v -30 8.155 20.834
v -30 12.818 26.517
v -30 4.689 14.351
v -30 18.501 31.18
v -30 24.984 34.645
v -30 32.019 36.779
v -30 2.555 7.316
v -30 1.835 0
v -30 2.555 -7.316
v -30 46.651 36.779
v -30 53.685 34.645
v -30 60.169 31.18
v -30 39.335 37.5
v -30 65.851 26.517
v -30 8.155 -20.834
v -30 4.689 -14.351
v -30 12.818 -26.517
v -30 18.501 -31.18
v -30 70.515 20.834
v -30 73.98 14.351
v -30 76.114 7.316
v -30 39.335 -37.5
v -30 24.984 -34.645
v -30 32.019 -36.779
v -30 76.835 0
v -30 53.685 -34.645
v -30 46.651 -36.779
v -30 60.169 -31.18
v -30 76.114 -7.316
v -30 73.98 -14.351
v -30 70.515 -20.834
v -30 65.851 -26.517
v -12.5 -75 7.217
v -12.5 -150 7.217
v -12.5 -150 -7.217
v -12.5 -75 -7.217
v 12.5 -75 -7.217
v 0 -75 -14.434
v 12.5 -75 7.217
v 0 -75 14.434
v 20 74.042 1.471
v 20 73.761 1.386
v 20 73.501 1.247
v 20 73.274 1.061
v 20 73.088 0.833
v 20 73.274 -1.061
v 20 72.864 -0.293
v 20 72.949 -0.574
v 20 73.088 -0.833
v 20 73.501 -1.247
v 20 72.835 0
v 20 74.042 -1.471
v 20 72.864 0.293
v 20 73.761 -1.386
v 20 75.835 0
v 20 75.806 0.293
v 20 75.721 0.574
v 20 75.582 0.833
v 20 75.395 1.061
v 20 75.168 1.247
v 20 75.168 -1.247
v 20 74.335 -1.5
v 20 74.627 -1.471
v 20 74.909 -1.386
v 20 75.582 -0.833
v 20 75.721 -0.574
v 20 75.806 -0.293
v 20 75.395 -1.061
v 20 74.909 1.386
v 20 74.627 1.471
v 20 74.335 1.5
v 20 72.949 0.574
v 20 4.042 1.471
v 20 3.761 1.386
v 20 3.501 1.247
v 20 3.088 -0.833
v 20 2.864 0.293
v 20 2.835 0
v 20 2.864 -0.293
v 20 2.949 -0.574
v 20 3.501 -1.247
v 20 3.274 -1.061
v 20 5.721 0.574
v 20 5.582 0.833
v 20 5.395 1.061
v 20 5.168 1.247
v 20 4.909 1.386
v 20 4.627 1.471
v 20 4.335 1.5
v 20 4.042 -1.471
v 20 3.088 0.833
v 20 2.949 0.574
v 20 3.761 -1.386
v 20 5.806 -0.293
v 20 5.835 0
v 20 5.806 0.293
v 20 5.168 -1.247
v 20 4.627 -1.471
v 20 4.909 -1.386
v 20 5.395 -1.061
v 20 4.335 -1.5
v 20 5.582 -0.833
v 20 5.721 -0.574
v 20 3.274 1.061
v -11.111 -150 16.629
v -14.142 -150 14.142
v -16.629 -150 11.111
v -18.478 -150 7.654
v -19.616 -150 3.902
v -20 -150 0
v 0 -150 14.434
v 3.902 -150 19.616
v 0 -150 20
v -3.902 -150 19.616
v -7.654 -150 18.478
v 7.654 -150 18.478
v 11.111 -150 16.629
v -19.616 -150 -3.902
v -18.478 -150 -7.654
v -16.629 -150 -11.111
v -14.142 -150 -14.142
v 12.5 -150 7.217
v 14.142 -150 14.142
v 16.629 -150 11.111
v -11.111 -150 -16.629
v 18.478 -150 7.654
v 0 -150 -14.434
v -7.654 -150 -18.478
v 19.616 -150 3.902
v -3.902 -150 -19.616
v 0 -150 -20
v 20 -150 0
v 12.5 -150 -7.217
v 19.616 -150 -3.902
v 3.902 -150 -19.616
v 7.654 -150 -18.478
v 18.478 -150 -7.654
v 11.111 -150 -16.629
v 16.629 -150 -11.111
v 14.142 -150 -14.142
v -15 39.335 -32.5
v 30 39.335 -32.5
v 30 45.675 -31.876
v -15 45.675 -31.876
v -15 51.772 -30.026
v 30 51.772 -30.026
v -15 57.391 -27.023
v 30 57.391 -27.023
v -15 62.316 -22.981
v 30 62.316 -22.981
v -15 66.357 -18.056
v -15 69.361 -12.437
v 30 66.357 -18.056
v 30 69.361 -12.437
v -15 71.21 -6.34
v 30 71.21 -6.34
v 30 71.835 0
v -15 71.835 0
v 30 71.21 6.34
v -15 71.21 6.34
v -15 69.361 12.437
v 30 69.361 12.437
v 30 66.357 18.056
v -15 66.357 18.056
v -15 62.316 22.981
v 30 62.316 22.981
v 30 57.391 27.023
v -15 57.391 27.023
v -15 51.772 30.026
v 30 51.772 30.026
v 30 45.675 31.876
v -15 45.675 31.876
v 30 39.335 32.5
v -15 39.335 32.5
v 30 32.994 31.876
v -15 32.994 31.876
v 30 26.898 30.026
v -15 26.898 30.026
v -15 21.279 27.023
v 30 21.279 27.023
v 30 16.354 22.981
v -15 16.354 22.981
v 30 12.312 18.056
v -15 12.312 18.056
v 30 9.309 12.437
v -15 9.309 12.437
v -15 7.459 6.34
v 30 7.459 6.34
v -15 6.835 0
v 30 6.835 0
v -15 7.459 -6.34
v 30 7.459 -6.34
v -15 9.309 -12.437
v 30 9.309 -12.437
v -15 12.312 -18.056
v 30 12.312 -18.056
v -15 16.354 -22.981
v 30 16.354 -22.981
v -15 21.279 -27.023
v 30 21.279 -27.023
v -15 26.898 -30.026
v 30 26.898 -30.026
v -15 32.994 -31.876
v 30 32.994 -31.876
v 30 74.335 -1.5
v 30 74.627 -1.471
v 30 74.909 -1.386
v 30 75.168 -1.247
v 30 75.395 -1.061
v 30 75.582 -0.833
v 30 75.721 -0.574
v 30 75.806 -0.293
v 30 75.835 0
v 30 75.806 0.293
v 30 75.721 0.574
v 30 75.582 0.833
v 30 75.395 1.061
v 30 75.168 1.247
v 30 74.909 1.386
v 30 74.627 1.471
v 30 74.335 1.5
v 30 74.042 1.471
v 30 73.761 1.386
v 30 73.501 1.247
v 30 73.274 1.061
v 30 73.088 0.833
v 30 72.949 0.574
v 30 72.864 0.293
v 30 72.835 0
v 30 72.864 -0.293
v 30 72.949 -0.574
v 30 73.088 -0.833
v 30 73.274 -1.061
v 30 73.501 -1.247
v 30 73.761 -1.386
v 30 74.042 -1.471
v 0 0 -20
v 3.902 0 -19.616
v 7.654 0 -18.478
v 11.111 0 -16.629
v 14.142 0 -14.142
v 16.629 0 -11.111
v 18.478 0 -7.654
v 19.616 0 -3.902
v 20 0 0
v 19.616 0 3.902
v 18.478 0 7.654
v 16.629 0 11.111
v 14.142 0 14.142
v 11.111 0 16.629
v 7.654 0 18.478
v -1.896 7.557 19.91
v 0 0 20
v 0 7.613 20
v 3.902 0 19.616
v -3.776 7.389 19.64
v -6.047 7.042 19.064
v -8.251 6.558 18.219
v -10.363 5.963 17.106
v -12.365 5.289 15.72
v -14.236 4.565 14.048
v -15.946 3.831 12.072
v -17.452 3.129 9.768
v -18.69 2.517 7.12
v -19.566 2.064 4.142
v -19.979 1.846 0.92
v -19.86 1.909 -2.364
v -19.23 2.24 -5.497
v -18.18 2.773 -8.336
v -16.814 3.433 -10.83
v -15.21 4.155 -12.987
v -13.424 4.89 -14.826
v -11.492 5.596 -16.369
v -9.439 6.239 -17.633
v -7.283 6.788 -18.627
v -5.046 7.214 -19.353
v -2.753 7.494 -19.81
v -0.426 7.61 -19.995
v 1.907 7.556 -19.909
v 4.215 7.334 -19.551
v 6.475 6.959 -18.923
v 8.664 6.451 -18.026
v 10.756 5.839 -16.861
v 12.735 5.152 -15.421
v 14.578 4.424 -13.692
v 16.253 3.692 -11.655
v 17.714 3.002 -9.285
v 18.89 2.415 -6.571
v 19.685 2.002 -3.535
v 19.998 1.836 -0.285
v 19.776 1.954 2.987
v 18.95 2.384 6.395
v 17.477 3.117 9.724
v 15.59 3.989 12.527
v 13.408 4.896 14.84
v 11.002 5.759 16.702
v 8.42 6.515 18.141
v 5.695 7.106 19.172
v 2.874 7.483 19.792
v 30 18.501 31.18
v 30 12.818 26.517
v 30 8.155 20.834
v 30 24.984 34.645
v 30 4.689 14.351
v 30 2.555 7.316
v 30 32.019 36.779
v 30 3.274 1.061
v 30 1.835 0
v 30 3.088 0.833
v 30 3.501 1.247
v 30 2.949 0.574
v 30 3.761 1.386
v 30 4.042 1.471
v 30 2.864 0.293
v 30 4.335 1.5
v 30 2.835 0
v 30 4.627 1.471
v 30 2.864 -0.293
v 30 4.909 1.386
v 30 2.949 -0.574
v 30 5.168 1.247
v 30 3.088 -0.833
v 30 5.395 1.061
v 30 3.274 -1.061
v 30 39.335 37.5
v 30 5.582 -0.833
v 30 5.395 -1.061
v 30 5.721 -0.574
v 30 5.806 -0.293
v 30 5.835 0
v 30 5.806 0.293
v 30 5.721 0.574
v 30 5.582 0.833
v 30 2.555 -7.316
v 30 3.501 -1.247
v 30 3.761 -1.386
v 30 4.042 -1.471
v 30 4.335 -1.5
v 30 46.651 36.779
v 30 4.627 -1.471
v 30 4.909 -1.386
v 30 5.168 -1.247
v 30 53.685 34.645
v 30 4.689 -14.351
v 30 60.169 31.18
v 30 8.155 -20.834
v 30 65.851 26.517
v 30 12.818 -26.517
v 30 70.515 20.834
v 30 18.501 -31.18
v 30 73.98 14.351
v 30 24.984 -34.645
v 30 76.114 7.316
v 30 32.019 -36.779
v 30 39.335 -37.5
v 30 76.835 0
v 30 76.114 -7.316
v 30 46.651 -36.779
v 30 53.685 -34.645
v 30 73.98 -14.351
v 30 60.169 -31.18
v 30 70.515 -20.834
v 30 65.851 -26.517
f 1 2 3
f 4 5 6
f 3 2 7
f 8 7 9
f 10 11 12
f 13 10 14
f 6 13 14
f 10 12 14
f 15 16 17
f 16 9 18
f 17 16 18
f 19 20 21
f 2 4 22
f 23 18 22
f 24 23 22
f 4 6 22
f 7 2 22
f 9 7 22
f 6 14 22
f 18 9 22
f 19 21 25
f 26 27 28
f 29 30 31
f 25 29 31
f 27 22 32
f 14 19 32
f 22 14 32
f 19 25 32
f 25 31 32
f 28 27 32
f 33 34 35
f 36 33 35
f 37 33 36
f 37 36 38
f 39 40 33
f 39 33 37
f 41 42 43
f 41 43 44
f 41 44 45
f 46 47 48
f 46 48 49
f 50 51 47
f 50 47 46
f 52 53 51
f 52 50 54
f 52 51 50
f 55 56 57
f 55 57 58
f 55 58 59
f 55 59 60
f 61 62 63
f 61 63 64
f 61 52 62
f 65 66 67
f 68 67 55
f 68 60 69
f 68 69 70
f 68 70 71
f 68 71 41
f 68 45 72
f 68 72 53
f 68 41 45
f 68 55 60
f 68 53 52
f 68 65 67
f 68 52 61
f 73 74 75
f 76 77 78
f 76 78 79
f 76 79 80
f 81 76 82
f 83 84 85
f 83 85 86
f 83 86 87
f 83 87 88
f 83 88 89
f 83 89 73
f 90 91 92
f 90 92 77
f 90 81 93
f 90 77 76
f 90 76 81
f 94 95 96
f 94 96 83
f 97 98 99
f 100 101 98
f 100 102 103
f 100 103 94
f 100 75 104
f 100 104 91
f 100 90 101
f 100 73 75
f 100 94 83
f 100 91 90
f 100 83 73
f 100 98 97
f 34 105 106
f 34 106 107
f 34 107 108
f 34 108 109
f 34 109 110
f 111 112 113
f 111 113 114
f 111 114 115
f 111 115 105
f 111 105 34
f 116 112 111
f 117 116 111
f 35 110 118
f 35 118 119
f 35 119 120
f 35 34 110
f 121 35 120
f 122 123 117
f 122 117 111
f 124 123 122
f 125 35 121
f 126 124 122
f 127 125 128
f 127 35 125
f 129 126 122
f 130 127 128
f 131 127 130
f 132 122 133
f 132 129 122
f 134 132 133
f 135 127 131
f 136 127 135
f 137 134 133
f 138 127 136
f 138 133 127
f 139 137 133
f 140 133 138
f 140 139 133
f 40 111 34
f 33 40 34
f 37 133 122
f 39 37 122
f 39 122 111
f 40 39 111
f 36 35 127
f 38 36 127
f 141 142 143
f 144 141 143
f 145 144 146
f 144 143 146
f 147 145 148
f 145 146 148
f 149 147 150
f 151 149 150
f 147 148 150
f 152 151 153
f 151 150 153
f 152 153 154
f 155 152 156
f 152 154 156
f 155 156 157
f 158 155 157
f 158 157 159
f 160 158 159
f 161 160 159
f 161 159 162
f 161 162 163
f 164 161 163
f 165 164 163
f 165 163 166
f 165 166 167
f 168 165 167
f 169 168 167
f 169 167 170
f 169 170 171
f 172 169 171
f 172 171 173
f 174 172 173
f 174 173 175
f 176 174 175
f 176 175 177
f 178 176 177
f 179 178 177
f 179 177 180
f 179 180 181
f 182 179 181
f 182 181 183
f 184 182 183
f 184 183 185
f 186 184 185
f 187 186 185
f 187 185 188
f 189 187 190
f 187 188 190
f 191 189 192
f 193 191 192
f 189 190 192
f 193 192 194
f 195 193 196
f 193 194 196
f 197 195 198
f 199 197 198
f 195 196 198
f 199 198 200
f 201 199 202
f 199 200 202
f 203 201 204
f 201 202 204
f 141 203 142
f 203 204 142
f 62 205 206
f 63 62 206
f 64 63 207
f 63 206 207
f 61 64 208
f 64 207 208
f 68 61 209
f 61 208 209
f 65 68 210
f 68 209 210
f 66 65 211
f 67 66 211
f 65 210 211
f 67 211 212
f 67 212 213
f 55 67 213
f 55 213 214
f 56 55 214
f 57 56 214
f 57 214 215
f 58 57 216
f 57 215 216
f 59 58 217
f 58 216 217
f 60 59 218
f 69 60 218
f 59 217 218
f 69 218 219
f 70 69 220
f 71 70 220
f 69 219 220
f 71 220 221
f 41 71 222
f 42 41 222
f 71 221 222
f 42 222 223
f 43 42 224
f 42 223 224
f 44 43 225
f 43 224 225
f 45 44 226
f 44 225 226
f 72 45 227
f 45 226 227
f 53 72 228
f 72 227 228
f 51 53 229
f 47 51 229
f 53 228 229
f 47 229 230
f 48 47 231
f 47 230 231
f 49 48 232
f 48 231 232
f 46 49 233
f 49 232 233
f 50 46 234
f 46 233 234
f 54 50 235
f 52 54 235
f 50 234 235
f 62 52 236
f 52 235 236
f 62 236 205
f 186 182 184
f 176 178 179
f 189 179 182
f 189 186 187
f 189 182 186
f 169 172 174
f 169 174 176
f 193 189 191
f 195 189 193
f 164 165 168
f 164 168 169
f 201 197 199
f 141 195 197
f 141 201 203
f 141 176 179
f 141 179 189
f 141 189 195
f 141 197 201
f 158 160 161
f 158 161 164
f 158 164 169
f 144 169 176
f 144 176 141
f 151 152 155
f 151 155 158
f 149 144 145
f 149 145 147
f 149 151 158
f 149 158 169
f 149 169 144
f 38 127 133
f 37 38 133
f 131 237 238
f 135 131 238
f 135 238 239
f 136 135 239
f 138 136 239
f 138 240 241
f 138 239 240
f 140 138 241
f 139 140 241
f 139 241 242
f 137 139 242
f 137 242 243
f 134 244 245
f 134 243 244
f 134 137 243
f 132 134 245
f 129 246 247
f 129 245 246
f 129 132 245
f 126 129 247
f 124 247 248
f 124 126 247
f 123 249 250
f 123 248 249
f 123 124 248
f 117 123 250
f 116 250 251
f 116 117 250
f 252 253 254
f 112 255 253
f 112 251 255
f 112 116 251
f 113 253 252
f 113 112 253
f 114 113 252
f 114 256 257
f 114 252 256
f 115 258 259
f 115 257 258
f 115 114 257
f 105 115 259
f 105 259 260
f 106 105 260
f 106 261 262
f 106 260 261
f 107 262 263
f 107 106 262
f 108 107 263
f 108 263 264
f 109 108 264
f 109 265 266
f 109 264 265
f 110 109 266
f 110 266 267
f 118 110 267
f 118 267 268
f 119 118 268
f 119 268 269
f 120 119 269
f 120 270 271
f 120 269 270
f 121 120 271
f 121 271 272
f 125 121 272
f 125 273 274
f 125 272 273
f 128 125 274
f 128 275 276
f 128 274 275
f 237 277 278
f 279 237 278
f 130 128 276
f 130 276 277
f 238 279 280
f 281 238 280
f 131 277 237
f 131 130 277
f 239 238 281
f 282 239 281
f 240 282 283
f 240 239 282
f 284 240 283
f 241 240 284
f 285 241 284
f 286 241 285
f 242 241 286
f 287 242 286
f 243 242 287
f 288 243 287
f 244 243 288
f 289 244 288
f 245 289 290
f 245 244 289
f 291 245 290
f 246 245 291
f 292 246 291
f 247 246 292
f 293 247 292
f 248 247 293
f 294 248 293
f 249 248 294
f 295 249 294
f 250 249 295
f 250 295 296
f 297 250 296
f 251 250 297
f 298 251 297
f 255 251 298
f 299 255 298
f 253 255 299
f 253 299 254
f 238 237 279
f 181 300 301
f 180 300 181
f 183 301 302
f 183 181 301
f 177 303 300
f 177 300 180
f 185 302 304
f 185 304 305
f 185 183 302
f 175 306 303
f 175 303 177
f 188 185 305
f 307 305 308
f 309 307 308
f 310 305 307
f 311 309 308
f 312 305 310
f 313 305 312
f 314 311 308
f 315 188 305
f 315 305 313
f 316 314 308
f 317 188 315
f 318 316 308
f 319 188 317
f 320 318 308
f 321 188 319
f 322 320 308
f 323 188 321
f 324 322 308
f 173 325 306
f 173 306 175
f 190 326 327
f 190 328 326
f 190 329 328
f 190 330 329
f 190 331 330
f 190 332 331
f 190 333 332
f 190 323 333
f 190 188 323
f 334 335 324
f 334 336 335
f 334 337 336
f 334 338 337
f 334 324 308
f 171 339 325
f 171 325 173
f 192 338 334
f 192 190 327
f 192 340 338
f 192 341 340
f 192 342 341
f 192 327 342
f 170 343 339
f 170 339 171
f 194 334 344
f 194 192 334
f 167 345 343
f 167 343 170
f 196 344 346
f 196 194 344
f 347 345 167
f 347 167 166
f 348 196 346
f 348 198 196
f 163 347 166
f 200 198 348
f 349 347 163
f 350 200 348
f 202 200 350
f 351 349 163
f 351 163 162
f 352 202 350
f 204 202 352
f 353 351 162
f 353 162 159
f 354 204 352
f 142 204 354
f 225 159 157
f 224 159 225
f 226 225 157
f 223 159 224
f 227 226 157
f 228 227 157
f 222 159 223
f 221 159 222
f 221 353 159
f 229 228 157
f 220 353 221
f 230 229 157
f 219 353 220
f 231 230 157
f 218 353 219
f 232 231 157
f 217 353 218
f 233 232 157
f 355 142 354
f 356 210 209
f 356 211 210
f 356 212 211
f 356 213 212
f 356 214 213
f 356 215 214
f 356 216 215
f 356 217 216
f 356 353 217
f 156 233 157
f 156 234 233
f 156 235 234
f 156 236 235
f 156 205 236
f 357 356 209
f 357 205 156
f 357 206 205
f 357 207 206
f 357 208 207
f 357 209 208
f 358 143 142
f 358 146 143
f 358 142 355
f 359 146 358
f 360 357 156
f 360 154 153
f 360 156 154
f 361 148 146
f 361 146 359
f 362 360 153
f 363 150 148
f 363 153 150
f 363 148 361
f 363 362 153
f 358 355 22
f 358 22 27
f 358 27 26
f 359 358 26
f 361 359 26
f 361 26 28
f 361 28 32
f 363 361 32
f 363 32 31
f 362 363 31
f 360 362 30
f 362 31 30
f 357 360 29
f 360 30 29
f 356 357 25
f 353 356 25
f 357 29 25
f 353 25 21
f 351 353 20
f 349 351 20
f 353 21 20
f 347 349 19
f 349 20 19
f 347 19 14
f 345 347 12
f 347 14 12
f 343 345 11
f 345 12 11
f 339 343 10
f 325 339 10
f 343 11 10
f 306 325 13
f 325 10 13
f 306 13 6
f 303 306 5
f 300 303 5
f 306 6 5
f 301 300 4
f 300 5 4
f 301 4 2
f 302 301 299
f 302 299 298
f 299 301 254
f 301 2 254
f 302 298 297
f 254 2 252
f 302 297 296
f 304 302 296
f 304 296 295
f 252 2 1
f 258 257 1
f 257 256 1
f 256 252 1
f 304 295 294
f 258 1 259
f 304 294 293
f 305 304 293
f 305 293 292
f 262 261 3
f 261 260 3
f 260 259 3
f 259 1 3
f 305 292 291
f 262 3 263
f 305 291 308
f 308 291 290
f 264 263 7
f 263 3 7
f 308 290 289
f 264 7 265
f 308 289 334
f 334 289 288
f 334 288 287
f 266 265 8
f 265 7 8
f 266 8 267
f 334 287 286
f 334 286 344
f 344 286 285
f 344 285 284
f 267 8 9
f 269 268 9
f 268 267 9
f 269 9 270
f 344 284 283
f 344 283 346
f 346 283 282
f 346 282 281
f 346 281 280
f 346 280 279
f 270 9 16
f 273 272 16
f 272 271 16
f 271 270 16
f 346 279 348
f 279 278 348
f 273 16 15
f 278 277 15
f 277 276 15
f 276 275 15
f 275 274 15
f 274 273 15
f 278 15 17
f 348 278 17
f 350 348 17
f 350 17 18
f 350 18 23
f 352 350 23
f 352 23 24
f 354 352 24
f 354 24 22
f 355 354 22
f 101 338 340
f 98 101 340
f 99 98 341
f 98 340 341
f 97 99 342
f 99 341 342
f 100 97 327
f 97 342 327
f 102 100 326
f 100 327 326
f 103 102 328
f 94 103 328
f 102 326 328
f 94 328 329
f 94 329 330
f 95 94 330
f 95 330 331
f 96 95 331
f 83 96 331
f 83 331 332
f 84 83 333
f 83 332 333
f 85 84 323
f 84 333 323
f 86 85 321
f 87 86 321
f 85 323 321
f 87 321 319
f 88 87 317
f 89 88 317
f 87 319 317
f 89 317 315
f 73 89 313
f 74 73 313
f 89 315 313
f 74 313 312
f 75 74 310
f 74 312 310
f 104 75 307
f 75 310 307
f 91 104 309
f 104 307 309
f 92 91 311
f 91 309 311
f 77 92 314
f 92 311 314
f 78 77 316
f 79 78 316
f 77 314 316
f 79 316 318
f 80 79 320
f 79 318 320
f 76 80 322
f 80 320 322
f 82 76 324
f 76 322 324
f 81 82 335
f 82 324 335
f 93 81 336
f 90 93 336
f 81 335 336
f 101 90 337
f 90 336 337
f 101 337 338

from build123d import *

# Parameters (mm, degrees)
SKETCH1_R                 = 20
BOSS_EXTRUDE1_DEPTH       = 25
BOSS_EXTRUDE2_START       = 100
SKETCH2_R                 = 20
BOSS_EXTRUDE2_DEPTH       = 100
BOSS_EXTRUDE4_START       = -100
SKETCH6_R                 = 20
BOSS_EXTRUDE4_DEPTH       = 100
SKETCH7_R                 = 25
CUT_EXTRUDE2_DEPTH        = 40
SKETCH8_R                 = 25
SKETCH8_R_2               = 22.5
BOSS_EXTRUDE7_DEPTH       = 40
SKETCH9_R                 = 25
BOSS_EXTRUDE8_DEPTH       = 2
BOSS_EXTRUDE10_DEPTH      = 38
CUT_EXTRUDE3_DEPTH        = 25
SKETCH12_R                = 25
CUT_EXTRUDE4_DEPTH        = 75
BOSS_EXTRUDE11_START      = 50
SKETCH14_R                = 20
BOSS_EXTRUDE11_DEPTH      = 50
BOSS_EXTRUDE12_DEPTH      = 10
BOSS_EXTRUDE12_DEPTH_BACK = 50
SKETCH13_R                = 37.5
SKETCH17_R                = 32.5
CUT_EXTRUDE5_DEPTH        = 50
BOSS_EXTRUDE13_START      = 2
SKETCH18_R                = 37.5
SKETCH18_R_2              = 32.5
BOSS_EXTRUDE13_DEPTH      = 2
SKETCH21_R                = 37.5
SKETCH21_R_2              = 32.5
CUT_EXTRUDE6_DEPTH        = 2
SKETCH22_R                = 1.5
CUT_EXTRUDE7_DEPTH        = 10
BOSS_EXTRUDE14_START      = 5
SKETCH27_R                = 32.5
BOSS_EXTRUDE14_DEPTH      = 5


with BuildPart() as part:
    # Sketch1 → Boss-Extrude1 (new body)
    with BuildSketch(Plane(origin=(0, 0, 0), x_dir=(1, 0, 0), z_dir=(0, 1, 0))):
        with Locations(Location((0, 0, 0), (0, 0, 270))):
            Circle(SKETCH1_R)
        Polygon((14.43375673, 0), (7.216878365, 12.5), (-7.216878365, 12.5), (-14.43375673, 0), (-7.216878365, -12.5), (7.216878365, -12.5), align=None, mode=Mode.SUBTRACT)
    extrude(amount=BOSS_EXTRUDE1_DEPTH)

    # Sketch2 → Boss-Extrude2 (add)
    with BuildSketch(Plane.XZ.offset(BOSS_EXTRUDE2_START)):
        with Locations(Location((0, 0, 0), (0, 0, 270))):
            Circle(SKETCH2_R)
    extrude(amount=-BOSS_EXTRUDE2_DEPTH)

    # Sketch6 → Boss-Extrude4 (add)
    with BuildSketch(Plane(origin=(0, 25, 0), x_dir=(1, 0, 0), z_dir=(0, 1, 0)).offset(BOSS_EXTRUDE4_START)):
        with Locations(Location((0, 0, 0), (0, 0, 90))):
            Circle(SKETCH6_R)
    extrude(amount=BOSS_EXTRUDE4_DEPTH)

    # Sketch7 → Cut-Extrude2 (cut)
    with BuildSketch(Plane(origin=(20, 0, 0), x_dir=(0, 0, -1), z_dir=(1, 0, 0))):
        with Locations((0, 39.286563349)):
            Circle(SKETCH7_R)
    extrude(amount=-CUT_EXTRUDE2_DEPTH, mode=Mode.SUBTRACT)

    # Sketch8 → Boss-Extrude7 (add)
    with BuildSketch(Plane(origin=(20, 0, 0), x_dir=(0, 0, -1), z_dir=(1, 0, 0))):
        with Locations((0, 39.252781264)):
            Circle(SKETCH8_R)
        with Locations((0, 39.252781264)):
            Circle(SKETCH8_R_2, mode=Mode.SUBTRACT)
    extrude(amount=-BOSS_EXTRUDE7_DEPTH)

    # Sketch9 → Boss-Extrude8 (add)
    with BuildSketch(Plane(origin=(20, 0, 0), x_dir=(0, 0, -1), z_dir=(1, 0, 0))):
        with Locations((0, 39.252781264)):
            Circle(SKETCH9_R)
    extrude(amount=-BOSS_EXTRUDE8_DEPTH)

    # Sketch10 → Boss-Extrude10 (add)
    with BuildSketch(Plane.ZY.offset(-18)):
        with BuildLine():
            Line((-15.081099266, 22.555163323), (15.081099266, 22.555163323))
            ThreePointArc((15.081099266, 22.555163323), (0, 16.752781264), (-15.081099266, 22.555163323))
        make_face()
    extrude(amount=BOSS_EXTRUDE10_DEPTH)

    # Sketch11 → Cut-Extrude3 (cut)
    with BuildSketch(Plane.XZ.offset(100)):
        Polygon((12.5, 7.216878365), (0, 14.43375673), (0, 0), (12.5, 0), align=None)
        Polygon((0, 0), (0, 14.43375673), (-12.5, 7.216878365), (-12.5, -7.216878365), (0, -14.43375673), (12.5, -7.216878365), (12.5, 0), align=None)
    extrude(amount=-CUT_EXTRUDE3_DEPTH, mode=Mode.SUBTRACT)

    # Sketch12 → Cut-Extrude4 (cut)
    with BuildSketch(Plane(origin=(20, 0, 0), x_dir=(0, 0, -1), z_dir=(1, 0, 0))):
        with Locations((0, 39.252781264)):
            Circle(SKETCH12_R)
    extrude(amount=-CUT_EXTRUDE4_DEPTH, mode=Mode.SUBTRACT)

    # Sketch14 → Boss-Extrude11 (add)
    with BuildSketch(Plane.XZ.offset(100).offset(BOSS_EXTRUDE11_START)):
        with Locations(Location((0, 0, 0), (0, 0, 270))):
            Circle(SKETCH14_R)
        Polygon((0, -14.43375673), (12.5, -7.216878365), (12.5, 7.216878365), (0, 14.43375673), (-12.5, 7.216878365), (-12.5, -7.216878365), align=None, mode=Mode.SUBTRACT)
    extrude(amount=-BOSS_EXTRUDE11_DEPTH)

    # Sketch13 → Boss-Extrude12 (add, two sides: drawn at the far end of the back side and taken through both)
    with BuildSketch(Plane(origin=(20, 0, 0), x_dir=(0, 0, -1), z_dir=(1, 0, 0)).offset(-BOSS_EXTRUDE12_DEPTH_BACK)):
        with Locations((0, 39.33472939)):
            Circle(SKETCH13_R)
    extrude(amount=BOSS_EXTRUDE12_DEPTH + BOSS_EXTRUDE12_DEPTH_BACK)

    # Sketch17 → Cut-Extrude5 (cut)
    with BuildSketch(Plane(origin=(30, 0, 0), x_dir=(0, 0, -1), z_dir=(1, 0, 0))):
        with Locations((0, 39.33472939)):
            Circle(SKETCH17_R)
    extrude(amount=-CUT_EXTRUDE5_DEPTH, mode=Mode.SUBTRACT)

    # Sketch18 → Boss-Extrude13 (add)
    with BuildSketch(Plane(origin=(30, 0, 0), x_dir=(0, 0, -1), z_dir=(1, 0, 0)).offset(BOSS_EXTRUDE13_START)):
        with Locations((0, 39.33472939)):
            Circle(SKETCH18_R)
        with Locations((0, 39.33472939)):
            Circle(SKETCH18_R_2, mode=Mode.SUBTRACT)
    extrude(amount=-BOSS_EXTRUDE13_DEPTH)

    # Sketch21 → Cut-Extrude6 (cut)
    with BuildSketch(Plane(origin=(32, 0, 0), x_dir=(0, 0, -1), z_dir=(1, 0, 0))):
        with Locations((0, 39.33472939)):
            Circle(SKETCH21_R)
        with Locations((0, 39.33472939)):
            Circle(SKETCH21_R_2, mode=Mode.SUBTRACT)
    extrude(amount=-CUT_EXTRUDE6_DEPTH, mode=Mode.SUBTRACT)

    # Sketch22 → Cut-Extrude7 (cut)
    with BuildSketch(Plane(origin=(30, 0, 0), x_dir=(0, 0, -1), z_dir=(1, 0, 0))):
        with Locations((0, 74.33472939)):
            Circle(SKETCH22_R)
        with Locations((0, 4.33472939)):
            Circle(SKETCH22_R)
    extrude(amount=-CUT_EXTRUDE7_DEPTH, mode=Mode.SUBTRACT)

    # Sketch27 → Boss-Extrude14 (add)
    with BuildSketch(Plane(origin=(-20, 0, 0), x_dir=(0, 0, -1), z_dir=(1, 0, 0)).offset(BOSS_EXTRUDE14_START)):
        with Locations((0, 39.33472939)):
            Circle(SKETCH27_R)
    extrude(amount=-BOSS_EXTRUDE14_DEPTH)


solid = part.part
